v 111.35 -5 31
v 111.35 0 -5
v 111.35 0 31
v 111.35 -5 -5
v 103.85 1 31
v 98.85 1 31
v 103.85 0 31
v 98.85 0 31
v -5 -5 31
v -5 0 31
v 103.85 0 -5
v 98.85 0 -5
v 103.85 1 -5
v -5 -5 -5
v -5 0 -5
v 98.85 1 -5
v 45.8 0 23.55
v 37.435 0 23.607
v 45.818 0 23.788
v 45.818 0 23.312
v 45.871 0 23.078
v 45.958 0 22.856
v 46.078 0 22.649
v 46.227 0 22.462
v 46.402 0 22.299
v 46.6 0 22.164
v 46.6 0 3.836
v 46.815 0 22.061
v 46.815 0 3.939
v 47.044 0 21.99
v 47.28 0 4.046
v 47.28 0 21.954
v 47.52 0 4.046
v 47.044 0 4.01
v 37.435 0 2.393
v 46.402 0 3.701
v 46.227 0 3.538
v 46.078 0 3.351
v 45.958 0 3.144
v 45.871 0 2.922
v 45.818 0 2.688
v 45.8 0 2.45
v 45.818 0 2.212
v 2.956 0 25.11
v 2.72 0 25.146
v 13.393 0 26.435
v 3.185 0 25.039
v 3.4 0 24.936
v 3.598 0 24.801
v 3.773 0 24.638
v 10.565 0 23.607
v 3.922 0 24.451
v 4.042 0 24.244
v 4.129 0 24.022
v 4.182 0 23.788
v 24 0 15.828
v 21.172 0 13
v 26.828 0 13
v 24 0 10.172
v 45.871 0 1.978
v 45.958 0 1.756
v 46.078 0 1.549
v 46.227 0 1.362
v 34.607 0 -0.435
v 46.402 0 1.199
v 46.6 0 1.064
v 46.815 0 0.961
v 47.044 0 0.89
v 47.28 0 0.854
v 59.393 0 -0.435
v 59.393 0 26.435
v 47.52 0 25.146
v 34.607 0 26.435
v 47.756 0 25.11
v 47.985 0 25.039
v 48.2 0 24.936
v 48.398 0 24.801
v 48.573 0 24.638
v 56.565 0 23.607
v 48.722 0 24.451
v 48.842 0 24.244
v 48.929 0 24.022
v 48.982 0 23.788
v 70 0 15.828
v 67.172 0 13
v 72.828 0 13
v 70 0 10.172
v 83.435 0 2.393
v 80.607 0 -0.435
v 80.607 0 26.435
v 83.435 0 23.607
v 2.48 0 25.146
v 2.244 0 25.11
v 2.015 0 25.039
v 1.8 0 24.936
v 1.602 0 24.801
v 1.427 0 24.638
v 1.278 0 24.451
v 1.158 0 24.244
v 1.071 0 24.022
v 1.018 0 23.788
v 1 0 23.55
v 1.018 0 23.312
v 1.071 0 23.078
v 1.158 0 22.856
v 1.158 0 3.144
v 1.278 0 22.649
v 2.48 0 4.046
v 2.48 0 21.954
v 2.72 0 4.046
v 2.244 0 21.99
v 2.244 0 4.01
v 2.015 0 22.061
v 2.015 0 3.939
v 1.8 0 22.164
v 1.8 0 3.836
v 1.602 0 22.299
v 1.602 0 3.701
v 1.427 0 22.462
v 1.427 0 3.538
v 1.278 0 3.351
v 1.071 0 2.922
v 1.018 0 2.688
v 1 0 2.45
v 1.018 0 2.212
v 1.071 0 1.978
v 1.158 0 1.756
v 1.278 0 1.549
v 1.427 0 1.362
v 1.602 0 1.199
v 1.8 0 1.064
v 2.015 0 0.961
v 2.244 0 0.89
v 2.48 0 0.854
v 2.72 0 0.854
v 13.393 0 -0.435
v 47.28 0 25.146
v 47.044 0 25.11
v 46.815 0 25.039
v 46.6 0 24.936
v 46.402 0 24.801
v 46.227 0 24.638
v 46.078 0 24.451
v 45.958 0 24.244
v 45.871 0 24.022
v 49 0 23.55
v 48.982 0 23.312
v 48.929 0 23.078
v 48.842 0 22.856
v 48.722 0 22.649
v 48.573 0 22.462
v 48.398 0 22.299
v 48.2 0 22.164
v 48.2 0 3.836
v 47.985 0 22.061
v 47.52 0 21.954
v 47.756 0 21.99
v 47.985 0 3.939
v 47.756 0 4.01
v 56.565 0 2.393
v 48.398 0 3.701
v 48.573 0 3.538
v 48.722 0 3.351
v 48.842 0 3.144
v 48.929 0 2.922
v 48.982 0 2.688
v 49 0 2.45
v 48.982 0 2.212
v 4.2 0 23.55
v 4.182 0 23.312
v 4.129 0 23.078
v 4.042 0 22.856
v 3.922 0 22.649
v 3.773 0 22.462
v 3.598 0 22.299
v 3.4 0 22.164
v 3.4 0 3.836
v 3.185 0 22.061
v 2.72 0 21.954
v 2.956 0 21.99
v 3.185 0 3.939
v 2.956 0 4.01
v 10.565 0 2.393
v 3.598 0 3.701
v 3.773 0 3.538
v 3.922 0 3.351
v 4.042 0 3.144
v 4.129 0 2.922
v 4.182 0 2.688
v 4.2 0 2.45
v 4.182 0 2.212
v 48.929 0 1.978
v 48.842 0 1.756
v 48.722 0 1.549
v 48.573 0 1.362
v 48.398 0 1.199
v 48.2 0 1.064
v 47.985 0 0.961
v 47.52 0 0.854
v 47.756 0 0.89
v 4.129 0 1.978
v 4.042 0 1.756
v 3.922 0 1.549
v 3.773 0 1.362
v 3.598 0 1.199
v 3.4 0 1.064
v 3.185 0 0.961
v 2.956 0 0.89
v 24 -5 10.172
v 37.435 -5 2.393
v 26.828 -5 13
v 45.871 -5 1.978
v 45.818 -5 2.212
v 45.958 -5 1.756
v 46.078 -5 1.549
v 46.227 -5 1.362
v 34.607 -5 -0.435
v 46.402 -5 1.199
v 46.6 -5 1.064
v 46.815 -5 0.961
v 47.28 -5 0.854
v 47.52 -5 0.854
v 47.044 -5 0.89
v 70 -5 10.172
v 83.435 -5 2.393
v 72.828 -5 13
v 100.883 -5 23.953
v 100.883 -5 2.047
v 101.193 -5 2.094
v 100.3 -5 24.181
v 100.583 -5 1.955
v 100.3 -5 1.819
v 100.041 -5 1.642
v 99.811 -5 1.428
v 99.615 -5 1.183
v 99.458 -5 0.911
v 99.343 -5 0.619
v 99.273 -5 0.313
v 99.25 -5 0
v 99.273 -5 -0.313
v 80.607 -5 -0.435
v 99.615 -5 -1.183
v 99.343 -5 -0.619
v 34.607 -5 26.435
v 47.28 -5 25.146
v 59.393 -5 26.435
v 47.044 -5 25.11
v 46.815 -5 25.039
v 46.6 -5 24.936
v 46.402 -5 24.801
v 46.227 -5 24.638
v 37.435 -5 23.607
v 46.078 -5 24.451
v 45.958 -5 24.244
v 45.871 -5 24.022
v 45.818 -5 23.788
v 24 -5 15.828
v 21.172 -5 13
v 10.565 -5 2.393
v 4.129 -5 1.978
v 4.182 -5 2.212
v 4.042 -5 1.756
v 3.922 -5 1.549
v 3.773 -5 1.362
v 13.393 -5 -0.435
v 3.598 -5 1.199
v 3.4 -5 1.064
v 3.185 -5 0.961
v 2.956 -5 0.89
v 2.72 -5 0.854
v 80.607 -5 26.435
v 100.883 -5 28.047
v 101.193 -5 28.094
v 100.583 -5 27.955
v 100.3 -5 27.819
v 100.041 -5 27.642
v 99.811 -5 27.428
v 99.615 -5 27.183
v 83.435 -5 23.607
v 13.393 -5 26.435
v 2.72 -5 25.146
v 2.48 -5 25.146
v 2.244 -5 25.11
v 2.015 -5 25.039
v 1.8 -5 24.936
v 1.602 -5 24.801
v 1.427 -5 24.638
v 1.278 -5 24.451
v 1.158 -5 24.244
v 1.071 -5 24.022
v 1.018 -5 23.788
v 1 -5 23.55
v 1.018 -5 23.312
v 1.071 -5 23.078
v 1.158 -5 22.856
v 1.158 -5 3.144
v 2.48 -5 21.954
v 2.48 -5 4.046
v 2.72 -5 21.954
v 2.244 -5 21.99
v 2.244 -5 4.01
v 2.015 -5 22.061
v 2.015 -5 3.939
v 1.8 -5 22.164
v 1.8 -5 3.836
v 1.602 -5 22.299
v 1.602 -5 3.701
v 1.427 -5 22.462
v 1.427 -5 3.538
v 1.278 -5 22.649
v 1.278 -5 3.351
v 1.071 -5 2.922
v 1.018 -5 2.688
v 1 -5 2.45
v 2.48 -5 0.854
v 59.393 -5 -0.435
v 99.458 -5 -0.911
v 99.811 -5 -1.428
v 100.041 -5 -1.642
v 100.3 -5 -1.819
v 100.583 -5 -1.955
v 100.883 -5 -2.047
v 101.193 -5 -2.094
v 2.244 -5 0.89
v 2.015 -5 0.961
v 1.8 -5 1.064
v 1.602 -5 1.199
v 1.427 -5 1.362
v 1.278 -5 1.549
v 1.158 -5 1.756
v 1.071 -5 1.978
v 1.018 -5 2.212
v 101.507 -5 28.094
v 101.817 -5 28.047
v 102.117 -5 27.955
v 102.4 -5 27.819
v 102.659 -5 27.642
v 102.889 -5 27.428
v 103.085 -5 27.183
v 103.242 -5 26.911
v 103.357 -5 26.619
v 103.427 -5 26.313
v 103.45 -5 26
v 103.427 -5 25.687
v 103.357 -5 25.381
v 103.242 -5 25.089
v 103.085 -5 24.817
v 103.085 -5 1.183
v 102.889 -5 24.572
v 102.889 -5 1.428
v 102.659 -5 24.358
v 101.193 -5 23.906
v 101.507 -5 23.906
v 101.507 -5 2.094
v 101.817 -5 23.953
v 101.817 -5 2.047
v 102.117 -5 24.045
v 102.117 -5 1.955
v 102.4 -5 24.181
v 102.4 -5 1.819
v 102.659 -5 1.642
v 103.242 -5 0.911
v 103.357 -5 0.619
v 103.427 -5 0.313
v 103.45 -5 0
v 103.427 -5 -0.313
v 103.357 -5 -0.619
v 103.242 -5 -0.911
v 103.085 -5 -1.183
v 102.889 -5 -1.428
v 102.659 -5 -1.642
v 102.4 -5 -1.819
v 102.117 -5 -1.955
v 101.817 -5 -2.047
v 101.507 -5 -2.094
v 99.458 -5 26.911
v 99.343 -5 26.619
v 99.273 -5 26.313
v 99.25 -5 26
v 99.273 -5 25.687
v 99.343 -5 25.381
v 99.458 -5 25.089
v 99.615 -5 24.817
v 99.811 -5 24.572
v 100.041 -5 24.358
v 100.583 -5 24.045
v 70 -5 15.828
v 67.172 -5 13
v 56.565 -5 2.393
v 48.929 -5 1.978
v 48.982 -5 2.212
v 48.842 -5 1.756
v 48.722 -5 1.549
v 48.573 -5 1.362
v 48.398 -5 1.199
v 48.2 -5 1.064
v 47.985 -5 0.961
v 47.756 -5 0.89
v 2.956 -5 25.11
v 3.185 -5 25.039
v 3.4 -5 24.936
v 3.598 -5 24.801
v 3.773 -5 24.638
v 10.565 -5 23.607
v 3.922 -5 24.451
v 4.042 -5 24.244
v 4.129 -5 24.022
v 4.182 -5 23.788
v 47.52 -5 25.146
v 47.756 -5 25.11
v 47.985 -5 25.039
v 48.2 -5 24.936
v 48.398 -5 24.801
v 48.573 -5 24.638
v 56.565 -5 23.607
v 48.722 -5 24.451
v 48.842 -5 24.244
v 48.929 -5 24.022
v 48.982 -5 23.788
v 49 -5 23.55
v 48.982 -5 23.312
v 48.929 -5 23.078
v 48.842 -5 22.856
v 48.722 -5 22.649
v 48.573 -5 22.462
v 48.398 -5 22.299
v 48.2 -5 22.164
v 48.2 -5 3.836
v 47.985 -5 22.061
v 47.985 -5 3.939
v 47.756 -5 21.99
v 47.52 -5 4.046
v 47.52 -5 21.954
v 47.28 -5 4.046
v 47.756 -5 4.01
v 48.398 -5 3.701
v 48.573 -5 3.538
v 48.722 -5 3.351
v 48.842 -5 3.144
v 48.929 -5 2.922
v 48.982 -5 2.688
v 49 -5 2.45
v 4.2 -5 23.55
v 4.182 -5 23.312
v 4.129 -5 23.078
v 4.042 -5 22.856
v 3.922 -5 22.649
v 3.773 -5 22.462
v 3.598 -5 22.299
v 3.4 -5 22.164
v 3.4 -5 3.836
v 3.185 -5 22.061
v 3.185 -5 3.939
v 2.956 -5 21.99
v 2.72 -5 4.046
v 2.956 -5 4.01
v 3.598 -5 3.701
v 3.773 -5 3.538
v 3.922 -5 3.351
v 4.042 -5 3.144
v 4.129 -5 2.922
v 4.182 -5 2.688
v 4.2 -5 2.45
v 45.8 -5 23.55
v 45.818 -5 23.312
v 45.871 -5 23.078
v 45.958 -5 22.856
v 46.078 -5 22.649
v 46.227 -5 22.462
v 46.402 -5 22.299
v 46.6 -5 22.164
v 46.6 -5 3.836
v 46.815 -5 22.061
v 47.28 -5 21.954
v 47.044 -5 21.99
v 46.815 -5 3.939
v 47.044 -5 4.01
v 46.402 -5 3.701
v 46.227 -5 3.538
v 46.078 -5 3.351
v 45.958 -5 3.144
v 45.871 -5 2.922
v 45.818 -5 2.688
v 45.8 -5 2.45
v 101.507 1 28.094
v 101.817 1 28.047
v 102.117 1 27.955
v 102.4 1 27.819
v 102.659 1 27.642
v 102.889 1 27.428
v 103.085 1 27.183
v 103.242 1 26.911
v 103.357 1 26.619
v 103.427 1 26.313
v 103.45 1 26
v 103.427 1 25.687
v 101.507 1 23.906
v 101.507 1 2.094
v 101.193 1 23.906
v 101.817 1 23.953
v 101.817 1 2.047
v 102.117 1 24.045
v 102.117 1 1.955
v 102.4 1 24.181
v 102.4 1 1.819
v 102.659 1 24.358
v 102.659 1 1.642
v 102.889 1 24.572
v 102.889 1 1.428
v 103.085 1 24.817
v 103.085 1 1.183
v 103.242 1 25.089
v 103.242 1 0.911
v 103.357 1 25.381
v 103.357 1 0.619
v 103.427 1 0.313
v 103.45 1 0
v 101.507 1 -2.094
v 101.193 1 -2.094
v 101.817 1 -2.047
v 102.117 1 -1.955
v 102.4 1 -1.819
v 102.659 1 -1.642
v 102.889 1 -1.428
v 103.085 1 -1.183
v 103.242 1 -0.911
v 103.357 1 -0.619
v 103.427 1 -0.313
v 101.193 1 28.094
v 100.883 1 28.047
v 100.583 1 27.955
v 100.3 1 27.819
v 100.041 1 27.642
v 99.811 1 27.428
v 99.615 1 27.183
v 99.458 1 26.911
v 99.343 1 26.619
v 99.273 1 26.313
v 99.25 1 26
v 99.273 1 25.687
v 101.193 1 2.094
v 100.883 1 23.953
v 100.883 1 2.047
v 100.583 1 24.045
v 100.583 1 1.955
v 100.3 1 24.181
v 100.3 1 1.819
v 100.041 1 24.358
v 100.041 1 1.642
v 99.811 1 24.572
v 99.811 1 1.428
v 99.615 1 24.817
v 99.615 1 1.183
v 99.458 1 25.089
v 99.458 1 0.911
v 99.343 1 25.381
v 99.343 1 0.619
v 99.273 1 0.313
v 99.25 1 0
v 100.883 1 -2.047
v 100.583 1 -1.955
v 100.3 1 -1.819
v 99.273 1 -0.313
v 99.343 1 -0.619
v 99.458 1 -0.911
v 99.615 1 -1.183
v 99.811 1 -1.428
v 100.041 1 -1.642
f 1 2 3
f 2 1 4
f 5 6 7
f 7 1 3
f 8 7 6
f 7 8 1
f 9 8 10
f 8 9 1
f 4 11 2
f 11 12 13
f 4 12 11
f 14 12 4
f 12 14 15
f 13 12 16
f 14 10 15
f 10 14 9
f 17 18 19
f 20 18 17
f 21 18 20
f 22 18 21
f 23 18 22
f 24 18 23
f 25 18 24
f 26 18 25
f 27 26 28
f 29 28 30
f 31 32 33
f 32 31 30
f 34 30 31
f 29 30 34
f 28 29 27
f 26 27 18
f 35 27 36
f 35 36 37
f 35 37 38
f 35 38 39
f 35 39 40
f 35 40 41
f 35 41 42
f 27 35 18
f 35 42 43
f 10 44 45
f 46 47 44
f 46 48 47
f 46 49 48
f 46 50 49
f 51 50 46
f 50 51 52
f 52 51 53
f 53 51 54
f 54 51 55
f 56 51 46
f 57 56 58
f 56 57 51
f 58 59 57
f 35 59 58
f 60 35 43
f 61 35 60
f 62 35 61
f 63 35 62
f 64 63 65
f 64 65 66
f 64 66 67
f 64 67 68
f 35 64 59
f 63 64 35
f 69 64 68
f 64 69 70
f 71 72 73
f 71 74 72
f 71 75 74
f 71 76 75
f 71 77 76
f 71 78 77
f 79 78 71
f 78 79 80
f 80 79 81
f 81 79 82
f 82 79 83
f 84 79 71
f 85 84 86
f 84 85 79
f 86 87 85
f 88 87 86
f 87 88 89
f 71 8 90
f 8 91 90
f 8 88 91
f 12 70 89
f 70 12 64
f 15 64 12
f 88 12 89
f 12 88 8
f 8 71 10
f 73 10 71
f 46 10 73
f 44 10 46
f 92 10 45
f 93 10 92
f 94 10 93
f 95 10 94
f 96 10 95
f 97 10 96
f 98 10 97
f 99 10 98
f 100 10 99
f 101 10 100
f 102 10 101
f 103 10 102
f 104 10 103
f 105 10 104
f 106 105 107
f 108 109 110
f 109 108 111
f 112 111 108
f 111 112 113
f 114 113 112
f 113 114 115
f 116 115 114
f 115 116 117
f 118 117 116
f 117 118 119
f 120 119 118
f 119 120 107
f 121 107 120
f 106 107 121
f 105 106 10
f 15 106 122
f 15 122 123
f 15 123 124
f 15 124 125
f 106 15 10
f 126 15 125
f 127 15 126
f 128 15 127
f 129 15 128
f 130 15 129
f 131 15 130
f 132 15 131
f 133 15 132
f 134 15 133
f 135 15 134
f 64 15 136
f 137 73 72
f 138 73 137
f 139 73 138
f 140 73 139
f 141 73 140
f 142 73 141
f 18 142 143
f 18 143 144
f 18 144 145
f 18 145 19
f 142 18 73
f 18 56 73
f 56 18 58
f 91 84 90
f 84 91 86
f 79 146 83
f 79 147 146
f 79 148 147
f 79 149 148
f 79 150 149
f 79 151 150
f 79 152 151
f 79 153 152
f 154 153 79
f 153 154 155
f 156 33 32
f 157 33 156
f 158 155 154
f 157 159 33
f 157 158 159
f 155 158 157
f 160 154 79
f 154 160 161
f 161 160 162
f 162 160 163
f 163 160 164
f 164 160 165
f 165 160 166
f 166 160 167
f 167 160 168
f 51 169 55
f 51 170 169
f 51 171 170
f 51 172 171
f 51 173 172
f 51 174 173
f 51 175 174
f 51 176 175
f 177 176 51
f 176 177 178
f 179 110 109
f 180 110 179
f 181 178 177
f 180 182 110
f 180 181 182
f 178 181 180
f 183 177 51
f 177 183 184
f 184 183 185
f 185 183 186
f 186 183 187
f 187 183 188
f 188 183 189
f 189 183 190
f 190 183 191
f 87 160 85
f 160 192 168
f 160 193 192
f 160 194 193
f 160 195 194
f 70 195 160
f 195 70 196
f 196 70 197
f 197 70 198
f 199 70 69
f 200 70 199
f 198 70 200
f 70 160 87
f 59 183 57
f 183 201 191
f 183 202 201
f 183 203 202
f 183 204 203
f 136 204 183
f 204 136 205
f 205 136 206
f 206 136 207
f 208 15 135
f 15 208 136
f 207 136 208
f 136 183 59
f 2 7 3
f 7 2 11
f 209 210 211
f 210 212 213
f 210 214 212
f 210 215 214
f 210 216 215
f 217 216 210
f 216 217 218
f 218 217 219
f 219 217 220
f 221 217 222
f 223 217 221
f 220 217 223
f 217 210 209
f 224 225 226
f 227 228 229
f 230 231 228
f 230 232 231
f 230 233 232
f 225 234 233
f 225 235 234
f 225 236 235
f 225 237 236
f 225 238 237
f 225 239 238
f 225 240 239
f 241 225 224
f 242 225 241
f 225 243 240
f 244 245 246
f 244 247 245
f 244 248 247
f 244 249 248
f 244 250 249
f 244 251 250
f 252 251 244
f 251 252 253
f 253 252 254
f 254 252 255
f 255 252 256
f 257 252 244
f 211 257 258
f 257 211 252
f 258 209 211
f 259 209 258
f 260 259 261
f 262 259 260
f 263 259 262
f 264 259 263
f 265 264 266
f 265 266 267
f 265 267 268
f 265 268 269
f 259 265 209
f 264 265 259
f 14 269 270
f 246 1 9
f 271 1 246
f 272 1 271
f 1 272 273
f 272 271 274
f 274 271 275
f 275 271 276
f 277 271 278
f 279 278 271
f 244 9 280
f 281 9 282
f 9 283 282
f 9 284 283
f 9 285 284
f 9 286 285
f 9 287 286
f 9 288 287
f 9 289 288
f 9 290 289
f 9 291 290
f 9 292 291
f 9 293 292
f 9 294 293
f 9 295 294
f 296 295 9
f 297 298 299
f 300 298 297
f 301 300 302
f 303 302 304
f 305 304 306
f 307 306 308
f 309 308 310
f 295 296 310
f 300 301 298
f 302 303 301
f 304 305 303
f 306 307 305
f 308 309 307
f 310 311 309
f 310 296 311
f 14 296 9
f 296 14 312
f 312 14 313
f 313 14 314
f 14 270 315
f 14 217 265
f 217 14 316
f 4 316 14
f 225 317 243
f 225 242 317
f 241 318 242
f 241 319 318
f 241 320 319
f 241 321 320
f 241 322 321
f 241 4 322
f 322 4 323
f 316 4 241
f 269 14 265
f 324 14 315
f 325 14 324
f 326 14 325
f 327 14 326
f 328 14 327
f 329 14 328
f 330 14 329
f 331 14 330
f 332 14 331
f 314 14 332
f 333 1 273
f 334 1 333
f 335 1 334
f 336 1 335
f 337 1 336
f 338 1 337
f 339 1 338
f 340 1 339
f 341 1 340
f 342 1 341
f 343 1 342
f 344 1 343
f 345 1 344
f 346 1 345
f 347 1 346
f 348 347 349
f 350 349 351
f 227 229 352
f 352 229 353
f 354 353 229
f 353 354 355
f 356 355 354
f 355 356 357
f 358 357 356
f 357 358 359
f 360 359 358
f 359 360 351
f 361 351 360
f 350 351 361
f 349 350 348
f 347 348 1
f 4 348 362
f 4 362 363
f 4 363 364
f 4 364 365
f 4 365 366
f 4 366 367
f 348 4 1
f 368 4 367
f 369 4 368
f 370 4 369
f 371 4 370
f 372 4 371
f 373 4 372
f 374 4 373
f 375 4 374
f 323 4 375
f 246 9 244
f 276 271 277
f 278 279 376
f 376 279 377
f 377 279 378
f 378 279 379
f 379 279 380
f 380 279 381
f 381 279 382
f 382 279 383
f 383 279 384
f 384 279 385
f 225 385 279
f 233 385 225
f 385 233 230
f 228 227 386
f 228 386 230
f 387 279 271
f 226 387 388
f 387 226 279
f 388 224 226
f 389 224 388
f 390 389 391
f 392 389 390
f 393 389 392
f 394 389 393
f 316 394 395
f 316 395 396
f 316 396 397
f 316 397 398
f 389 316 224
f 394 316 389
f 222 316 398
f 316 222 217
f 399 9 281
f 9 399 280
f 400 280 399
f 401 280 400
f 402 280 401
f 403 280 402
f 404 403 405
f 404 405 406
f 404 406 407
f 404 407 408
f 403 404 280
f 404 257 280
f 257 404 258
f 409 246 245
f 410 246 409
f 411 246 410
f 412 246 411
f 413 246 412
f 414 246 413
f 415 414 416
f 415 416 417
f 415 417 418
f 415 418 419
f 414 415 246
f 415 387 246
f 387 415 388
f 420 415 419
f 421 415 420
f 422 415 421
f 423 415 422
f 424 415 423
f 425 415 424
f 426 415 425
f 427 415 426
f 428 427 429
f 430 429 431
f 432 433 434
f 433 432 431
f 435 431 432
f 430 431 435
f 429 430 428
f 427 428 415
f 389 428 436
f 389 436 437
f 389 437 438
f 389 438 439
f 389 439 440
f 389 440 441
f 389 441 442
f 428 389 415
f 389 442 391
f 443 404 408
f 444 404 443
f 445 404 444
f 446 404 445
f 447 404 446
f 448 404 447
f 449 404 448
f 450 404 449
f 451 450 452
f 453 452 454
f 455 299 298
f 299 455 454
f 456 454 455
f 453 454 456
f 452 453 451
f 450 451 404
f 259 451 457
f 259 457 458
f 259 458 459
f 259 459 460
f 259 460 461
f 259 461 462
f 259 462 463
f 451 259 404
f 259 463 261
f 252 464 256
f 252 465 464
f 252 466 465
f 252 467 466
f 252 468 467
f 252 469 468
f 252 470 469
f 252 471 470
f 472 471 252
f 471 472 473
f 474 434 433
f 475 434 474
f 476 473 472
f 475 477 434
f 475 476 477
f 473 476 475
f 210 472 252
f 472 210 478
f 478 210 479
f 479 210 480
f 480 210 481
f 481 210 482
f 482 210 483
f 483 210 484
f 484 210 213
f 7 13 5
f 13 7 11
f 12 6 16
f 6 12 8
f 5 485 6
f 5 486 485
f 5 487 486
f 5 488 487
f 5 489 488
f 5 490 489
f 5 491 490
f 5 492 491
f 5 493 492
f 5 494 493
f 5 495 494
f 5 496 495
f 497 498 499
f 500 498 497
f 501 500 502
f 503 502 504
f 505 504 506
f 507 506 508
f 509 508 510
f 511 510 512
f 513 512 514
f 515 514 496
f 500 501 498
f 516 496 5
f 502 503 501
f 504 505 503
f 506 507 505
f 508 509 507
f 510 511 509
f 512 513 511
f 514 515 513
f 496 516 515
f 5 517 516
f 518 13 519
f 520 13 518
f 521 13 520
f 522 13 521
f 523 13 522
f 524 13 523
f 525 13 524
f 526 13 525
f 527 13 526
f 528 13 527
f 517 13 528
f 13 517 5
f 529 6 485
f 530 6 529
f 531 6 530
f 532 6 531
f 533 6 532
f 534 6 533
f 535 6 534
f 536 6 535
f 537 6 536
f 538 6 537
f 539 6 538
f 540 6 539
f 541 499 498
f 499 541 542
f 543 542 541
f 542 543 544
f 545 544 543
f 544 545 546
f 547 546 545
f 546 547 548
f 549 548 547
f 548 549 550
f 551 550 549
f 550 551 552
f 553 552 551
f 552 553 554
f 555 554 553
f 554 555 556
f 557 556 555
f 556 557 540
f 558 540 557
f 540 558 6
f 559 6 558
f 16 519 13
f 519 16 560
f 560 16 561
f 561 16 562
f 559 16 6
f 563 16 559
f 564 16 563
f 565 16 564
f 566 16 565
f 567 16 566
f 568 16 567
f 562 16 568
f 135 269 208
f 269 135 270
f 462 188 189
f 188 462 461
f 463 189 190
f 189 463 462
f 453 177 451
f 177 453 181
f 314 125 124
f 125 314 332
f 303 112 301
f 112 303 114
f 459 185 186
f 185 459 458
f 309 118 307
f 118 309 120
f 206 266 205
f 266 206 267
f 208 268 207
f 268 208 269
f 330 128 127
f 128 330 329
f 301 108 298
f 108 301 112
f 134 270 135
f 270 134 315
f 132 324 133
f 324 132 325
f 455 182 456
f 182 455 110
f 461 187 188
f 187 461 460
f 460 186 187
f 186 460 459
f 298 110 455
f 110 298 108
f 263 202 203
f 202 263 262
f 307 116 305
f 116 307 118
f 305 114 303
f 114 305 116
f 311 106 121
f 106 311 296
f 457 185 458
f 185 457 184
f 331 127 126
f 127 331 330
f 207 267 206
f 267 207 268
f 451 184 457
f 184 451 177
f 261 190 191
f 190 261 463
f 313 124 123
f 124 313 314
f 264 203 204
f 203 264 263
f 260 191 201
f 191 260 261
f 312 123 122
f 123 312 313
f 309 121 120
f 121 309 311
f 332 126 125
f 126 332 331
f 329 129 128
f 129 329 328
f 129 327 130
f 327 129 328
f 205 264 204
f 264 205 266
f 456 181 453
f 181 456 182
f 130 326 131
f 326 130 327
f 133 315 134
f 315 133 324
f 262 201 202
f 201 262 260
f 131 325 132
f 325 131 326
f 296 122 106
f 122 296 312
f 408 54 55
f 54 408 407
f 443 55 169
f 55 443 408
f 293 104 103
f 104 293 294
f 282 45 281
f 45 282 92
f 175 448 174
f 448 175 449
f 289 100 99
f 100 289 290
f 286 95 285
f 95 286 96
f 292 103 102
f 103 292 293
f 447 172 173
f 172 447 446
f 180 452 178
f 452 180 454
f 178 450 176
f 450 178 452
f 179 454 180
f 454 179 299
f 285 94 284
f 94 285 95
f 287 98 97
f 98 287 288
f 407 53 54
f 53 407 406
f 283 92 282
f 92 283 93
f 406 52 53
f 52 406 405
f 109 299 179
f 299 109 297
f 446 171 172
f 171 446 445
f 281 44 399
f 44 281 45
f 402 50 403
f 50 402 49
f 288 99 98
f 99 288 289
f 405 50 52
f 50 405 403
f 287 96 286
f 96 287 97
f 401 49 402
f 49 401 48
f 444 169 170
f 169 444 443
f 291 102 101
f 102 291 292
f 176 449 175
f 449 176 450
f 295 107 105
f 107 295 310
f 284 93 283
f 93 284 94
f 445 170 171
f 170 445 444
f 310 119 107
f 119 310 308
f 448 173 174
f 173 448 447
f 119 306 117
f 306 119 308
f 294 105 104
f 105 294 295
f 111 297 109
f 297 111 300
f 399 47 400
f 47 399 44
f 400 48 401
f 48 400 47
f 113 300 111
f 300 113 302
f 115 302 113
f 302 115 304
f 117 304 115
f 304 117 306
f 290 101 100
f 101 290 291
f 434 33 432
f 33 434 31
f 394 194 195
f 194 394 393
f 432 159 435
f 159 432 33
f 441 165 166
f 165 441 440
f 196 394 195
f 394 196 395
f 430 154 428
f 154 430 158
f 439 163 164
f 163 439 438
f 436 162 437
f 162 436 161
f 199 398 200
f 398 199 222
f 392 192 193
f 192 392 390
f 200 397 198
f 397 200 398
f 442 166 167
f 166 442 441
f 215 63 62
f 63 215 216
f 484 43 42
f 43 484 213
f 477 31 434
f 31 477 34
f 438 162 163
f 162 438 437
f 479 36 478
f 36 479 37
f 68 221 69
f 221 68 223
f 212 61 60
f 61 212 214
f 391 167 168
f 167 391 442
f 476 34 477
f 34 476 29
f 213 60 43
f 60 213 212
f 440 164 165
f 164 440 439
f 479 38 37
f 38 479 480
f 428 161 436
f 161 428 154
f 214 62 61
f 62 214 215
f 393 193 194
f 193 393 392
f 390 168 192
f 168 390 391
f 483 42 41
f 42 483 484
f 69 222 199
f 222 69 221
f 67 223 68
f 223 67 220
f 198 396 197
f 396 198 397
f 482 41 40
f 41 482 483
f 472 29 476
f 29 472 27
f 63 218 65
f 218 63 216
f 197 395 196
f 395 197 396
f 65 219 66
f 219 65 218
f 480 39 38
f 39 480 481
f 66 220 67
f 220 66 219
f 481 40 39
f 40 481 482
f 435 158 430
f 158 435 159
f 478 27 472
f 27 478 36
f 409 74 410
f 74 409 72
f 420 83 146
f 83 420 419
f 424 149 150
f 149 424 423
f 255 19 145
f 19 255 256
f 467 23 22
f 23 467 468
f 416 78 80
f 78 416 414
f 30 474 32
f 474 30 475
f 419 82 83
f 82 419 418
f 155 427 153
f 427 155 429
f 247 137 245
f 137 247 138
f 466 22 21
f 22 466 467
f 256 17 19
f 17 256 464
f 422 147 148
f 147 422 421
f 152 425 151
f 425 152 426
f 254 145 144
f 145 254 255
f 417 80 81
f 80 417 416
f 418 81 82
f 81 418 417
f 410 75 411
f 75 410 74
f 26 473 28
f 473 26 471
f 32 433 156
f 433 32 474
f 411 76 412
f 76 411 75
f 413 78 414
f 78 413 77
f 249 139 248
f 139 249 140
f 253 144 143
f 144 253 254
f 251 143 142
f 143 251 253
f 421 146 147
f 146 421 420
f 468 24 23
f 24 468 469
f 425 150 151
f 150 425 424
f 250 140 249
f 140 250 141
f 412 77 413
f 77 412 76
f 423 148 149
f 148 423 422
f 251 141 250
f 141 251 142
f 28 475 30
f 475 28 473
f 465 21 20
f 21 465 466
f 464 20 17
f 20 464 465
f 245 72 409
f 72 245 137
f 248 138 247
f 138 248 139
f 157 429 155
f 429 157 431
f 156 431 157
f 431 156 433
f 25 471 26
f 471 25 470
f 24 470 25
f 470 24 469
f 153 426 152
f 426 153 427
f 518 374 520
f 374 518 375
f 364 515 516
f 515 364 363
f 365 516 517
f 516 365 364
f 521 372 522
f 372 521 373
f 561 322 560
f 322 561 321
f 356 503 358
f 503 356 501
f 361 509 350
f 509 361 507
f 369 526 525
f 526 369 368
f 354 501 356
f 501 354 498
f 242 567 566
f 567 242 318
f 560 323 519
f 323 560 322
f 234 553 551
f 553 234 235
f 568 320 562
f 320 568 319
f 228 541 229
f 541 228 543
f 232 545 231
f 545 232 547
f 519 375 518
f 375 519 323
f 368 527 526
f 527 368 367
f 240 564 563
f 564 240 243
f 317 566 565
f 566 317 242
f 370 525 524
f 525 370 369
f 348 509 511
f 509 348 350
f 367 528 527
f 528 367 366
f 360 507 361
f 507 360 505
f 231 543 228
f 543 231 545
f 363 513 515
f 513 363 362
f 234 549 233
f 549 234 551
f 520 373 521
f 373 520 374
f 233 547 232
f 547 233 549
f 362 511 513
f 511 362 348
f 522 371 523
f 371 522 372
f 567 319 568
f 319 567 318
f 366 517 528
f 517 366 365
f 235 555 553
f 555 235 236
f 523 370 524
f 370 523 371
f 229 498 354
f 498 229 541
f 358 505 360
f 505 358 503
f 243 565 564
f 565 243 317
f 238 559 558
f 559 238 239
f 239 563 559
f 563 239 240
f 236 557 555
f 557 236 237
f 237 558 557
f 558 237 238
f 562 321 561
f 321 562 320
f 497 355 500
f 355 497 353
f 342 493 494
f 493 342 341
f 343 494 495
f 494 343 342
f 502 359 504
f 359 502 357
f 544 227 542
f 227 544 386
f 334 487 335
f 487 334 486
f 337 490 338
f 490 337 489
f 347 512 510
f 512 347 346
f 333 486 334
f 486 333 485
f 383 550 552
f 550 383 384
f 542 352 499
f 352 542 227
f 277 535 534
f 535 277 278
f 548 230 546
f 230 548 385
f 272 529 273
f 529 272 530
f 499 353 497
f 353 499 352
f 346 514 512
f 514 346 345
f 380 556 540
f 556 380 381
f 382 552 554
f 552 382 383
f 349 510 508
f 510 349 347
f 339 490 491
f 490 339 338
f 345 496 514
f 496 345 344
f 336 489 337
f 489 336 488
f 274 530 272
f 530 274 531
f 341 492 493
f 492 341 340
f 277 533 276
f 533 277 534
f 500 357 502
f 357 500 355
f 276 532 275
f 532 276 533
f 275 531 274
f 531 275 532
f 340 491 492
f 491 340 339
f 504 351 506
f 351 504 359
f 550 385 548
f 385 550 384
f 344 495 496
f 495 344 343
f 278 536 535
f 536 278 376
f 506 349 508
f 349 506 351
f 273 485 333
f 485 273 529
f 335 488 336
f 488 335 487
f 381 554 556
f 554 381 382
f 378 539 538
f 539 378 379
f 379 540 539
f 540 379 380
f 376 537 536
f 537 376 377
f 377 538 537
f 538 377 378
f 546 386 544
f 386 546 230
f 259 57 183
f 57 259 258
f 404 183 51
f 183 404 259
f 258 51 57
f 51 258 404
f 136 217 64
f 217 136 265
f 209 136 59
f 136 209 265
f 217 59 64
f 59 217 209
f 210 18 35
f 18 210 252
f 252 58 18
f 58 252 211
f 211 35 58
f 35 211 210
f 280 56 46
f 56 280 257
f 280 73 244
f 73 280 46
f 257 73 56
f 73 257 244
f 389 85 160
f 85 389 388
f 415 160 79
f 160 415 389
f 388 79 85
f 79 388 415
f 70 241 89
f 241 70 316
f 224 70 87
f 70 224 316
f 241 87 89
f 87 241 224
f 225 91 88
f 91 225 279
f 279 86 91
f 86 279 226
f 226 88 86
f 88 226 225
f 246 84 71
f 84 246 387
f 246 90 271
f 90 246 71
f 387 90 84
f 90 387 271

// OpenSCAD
psu_width = 112.7;
psu_height = 49.8;
psu_length = 216;
psu_screw = 4.2;
psu_screw_off_x = 29.5 + 3.2 / 2;
psu_screw_off_y = 29.35 + 3.2 / 2;
psu_screw_dist_x = 53.3 - 3.2;
psu_screw_dist_y = 154.3 - 3.2;

psu_wall_dist = 10;
mount_wall = 5.0;
mount_width = 12.0;
mount_height = 70;
mount_screw = 4.2;

$fn = 42;

module prism(l, w, h) {
    polyhedron(
        points = [[0,0,0], [l,0,0], [l,w,0], [0,w,0], [0,w,h], [l,w,h]],
        faces = [[0,1,2,3],[5,4,3,2],[0,4,5,1],[0,3,4],[5,2,1]]
    );
}

module psu() {
    cube([psu_width, psu_height, psu_length]);
    
    for (x = [0, psu_screw_dist_x])
    for (y = [0, psu_screw_dist_y])
    translate([psu_screw_off_x + x, 0, psu_screw_off_y + y])
    rotate([90, 0, 0])
    cylinder(d = psu_screw - 1.0, h = 10.0);
}

module mount_geo() {
    difference() {
        union() {
            hull() {
                translate([psu_width - psu_screw_off_x - psu_screw_dist_x - mount_width, -mount_wall, -mount_width / 2])
                cube([psu_screw_dist_x + psu_screw_off_x + psu_wall_dist + mount_width, mount_wall, mount_width]);
                
                translate([psu_width + psu_wall_dist, -mount_wall, -mount_width / 2])
                cube([20, mount_wall, mount_height]);
            }
            
            translate([psu_width + psu_wall_dist + 7.5, 0, -mount_width / 2])
            cube([5, 1, mount_height]);
        }
        
        translate([psu_screw_off_x + 8, 1, mount_width / 2])
        rotate([0, 0, -90])
        prism(mount_wall + 2, psu_width - psu_screw_off_x + psu_wall_dist - 8, mount_height - mount_width - mount_wall - 8);
        
        for (x = [0, psu_screw_dist_x])
        translate([psu_screw_off_x + x, 1, 0])
        rotate([90, 0, 0])
        cylinder(d = psu_screw, h = mount_wall + 2);
        
        for (y = [0, (mount_height - mount_width) / 2, mount_height - mount_width])
        translate([psu_width + psu_wall_dist + 10, 2, y])
        rotate([90, 0, 0])
        cylinder(d = mount_screw, h = mount_wall + 3);
    }
}

module mount(type) {
    scale([1, 1, -1 * (type * 2 - 1)])
    mount_geo();
}

relais_width = 50;
relais_height = 26;
relais_depth = 17;
relais_screw = 3.2;
relais_screw_dist_x = 44.8;
relais_screw_dist_y = 21.1;
relais_mount_off_y = 30;

relais_wall_dist = relais_mount_off_y;
mount_relais_wall = 5.0;
mount_relais_screw = 4.2;
relais_screw_off_x = (relais_width - relais_screw_dist_x) / 2;
relais_screw_off_y = (relais_height - relais_screw_dist_y) / 2;
mount_relais_width = relais_width + 2 * mount_relais_wall;
mount_relais_width_add = (psu_width - relais_width) / 2 + mount_relais_wall + 20;
mount_relais_height = relais_height + 2 * mount_relais_wall;

module relais() {
    cube([relais_width, 5, relais_height]);
    
    translate([relais_width / 2 - 5, 5, relais_height / 2 - 5])
    cube([10, relais_depth - 5, 10]);
    
    for (x = [-1, 1])
    for (y = [-1, 1])
    translate([relais_width / 2 + x * relais_screw_dist_x / 2, 0, relais_height / 2 + y * relais_screw_dist_y / 2])
    rotate([90, 0, 0])
    cylinder(d = relais_screw, h = 10);
}

module cutout(l, o) {
    for (r = [0, 90, 180, 270])
    rotate([r + 45, 0, -90])
    translate([0, -l - o, o])
    prism(mount_relais_wall + 2, l, l);
}

module mount_relais() {
    difference() {
        union() {
            translate([-mount_relais_wall, -mount_relais_wall, -mount_relais_wall])
            cube([mount_relais_width + mount_relais_width_add, mount_relais_wall, mount_relais_height]);
                
            translate([mount_relais_width + mount_relais_width_add - mount_relais_wall - 12.5, 0, -mount_relais_wall])
            cube([5, 1, mount_relais_height]);
        }
        
        for (x = [-1, 1])
        for (y = [-1, 1])
        translate([relais_width / 2 + x * relais_screw_dist_x / 2, 1, relais_height / 2 + y * relais_screw_dist_y / 2])
        rotate([90, 0, 0])
        cylinder(d = relais_screw, h = 10);
        
        for (y = [0, mount_relais_height - mount_relais_wall * 2])
        translate([mount_relais_width + mount_relais_width_add - mount_relais_wall - 10, 2, y])
        rotate([90, 0, 0])
        cylinder(d = mount_relais_screw, h = mount_relais_wall + 3);
        
        translate([24, 1, 13])
        cutout(15, 2);
        translate([70, 1, 13])
        cutout(15, 2);
    }
}

psu2_width = 70.25;
psu2_height = 31.2;
psu2_length = 39.0;
psu2_screw = 3.2;
psu2_screw_off_x = 5.0 - 3.2 / 2;
psu2_screw_off_y = 11.6 + 3.2 / 2;
psu2_screw_dist_x = 59.6 + 3.2;
psu2_screw_dist_y = 0;

module psu2() {
    cube([psu2_width, psu2_height, psu2_length]);
    
    for (x = [0, psu2_screw_dist_x])
    for (y = [0, psu2_screw_dist_y])
    translate([psu2_screw_off_x + x, 0, psu2_screw_off_y + y])
    rotate([90, 0, 0])
    cylinder(d = psu2_screw - 1.0, h = 10.0);
}

psu2_mount_off_y = relais_mount_off_y;
psu2_wall_dist = (psu_width - psu2_width) / 2 + psu_wall_dist;
mount2_wall = 5.0;
mount2_width = 8.0;
mount2_height = 50;
mount2_screw = 4.2;

module mount2() {
    difference() {
        union() {
            hull() {
                translate([psu2_width - psu2_screw_off_x - psu2_screw_dist_x - mount2_width, -mount2_wall, -mount2_width / 2])
                cube([psu2_screw_dist_x + psu2_screw_off_x + psu2_wall_dist + mount2_width, mount2_wall, mount2_width]);
                
                translate([psu2_width + psu2_wall_dist, -mount2_wall, -mount2_width / 2])
                cube([20, mount2_wall, mount2_height]);
            }
            
            translate([psu2_width + psu2_wall_dist + 7.5, 0, -mount2_width / 2])
            cube([5, 1, mount2_height]);
        }
        
        translate([psu2_screw_off_x + 8, 1, mount2_width / 2])
        rotate([0, 0, -90])
        prism(mount2_wall + 2, psu2_width - psu2_screw_off_x + psu2_wall_dist - 8, mount2_height - mount2_width - mount2_wall - 8 + 5);
        
        for (x = [0, psu2_screw_dist_x])
        translate([psu2_screw_off_x + x, 1, 0])
        rotate([90, 0, 0])
        cylinder(d = psu2_screw, h = mount2_wall + 2);
        
        for (y = [0, mount2_height - mount2_width])
        translate([psu2_width + psu2_wall_dist + 10, 2, y])
        rotate([90, 0, 0])
        cylinder(d = mount2_screw, h = mount2_wall + 3);
    }
}

module assembly() {
    %psu();
    
    %translate([psu_width + psu_wall_dist, 0, 0])
    cube([20, 40, 400]);
    
    for (i = [0, 1])
    translate([0, 0, psu_screw_off_y + i * psu_screw_dist_y])
    mount(i);
    
    %translate([(psu_width - relais_width) / 2, 0, psu_length + relais_mount_off_y])
    relais();
    
    %translate([(psu_width - psu2_width) / 2, 0, psu_length + relais_mount_off_y + relais_height + psu2_mount_off_y])
    psu2();
    
    translate([(psu_width - psu2_width) / 2, 0, psu_length + relais_mount_off_y + relais_height + psu2_mount_off_y + psu2_screw_off_y])
    mount2();
    
    translate([(psu_width - relais_width) / 2, 0, psu_length + relais_mount_off_y])
    mount_relais();
}

module print() {
    translate([0, 0, mount_wall])
    rotate([90, 0, 0])
    mount(0);
    
    translate([0, 40, mount_wall])
    rotate([90, 0, 0])
    mount(1);
    
    translate([-150, 40, mount2_wall])
    rotate([90, 0, 0])
    mount2();
    
    translate([-150, -30, mount_relais_wall])
    rotate([90, 0, 0])
    mount_relais();
}

//assembly();
//print();
mount_relais();
